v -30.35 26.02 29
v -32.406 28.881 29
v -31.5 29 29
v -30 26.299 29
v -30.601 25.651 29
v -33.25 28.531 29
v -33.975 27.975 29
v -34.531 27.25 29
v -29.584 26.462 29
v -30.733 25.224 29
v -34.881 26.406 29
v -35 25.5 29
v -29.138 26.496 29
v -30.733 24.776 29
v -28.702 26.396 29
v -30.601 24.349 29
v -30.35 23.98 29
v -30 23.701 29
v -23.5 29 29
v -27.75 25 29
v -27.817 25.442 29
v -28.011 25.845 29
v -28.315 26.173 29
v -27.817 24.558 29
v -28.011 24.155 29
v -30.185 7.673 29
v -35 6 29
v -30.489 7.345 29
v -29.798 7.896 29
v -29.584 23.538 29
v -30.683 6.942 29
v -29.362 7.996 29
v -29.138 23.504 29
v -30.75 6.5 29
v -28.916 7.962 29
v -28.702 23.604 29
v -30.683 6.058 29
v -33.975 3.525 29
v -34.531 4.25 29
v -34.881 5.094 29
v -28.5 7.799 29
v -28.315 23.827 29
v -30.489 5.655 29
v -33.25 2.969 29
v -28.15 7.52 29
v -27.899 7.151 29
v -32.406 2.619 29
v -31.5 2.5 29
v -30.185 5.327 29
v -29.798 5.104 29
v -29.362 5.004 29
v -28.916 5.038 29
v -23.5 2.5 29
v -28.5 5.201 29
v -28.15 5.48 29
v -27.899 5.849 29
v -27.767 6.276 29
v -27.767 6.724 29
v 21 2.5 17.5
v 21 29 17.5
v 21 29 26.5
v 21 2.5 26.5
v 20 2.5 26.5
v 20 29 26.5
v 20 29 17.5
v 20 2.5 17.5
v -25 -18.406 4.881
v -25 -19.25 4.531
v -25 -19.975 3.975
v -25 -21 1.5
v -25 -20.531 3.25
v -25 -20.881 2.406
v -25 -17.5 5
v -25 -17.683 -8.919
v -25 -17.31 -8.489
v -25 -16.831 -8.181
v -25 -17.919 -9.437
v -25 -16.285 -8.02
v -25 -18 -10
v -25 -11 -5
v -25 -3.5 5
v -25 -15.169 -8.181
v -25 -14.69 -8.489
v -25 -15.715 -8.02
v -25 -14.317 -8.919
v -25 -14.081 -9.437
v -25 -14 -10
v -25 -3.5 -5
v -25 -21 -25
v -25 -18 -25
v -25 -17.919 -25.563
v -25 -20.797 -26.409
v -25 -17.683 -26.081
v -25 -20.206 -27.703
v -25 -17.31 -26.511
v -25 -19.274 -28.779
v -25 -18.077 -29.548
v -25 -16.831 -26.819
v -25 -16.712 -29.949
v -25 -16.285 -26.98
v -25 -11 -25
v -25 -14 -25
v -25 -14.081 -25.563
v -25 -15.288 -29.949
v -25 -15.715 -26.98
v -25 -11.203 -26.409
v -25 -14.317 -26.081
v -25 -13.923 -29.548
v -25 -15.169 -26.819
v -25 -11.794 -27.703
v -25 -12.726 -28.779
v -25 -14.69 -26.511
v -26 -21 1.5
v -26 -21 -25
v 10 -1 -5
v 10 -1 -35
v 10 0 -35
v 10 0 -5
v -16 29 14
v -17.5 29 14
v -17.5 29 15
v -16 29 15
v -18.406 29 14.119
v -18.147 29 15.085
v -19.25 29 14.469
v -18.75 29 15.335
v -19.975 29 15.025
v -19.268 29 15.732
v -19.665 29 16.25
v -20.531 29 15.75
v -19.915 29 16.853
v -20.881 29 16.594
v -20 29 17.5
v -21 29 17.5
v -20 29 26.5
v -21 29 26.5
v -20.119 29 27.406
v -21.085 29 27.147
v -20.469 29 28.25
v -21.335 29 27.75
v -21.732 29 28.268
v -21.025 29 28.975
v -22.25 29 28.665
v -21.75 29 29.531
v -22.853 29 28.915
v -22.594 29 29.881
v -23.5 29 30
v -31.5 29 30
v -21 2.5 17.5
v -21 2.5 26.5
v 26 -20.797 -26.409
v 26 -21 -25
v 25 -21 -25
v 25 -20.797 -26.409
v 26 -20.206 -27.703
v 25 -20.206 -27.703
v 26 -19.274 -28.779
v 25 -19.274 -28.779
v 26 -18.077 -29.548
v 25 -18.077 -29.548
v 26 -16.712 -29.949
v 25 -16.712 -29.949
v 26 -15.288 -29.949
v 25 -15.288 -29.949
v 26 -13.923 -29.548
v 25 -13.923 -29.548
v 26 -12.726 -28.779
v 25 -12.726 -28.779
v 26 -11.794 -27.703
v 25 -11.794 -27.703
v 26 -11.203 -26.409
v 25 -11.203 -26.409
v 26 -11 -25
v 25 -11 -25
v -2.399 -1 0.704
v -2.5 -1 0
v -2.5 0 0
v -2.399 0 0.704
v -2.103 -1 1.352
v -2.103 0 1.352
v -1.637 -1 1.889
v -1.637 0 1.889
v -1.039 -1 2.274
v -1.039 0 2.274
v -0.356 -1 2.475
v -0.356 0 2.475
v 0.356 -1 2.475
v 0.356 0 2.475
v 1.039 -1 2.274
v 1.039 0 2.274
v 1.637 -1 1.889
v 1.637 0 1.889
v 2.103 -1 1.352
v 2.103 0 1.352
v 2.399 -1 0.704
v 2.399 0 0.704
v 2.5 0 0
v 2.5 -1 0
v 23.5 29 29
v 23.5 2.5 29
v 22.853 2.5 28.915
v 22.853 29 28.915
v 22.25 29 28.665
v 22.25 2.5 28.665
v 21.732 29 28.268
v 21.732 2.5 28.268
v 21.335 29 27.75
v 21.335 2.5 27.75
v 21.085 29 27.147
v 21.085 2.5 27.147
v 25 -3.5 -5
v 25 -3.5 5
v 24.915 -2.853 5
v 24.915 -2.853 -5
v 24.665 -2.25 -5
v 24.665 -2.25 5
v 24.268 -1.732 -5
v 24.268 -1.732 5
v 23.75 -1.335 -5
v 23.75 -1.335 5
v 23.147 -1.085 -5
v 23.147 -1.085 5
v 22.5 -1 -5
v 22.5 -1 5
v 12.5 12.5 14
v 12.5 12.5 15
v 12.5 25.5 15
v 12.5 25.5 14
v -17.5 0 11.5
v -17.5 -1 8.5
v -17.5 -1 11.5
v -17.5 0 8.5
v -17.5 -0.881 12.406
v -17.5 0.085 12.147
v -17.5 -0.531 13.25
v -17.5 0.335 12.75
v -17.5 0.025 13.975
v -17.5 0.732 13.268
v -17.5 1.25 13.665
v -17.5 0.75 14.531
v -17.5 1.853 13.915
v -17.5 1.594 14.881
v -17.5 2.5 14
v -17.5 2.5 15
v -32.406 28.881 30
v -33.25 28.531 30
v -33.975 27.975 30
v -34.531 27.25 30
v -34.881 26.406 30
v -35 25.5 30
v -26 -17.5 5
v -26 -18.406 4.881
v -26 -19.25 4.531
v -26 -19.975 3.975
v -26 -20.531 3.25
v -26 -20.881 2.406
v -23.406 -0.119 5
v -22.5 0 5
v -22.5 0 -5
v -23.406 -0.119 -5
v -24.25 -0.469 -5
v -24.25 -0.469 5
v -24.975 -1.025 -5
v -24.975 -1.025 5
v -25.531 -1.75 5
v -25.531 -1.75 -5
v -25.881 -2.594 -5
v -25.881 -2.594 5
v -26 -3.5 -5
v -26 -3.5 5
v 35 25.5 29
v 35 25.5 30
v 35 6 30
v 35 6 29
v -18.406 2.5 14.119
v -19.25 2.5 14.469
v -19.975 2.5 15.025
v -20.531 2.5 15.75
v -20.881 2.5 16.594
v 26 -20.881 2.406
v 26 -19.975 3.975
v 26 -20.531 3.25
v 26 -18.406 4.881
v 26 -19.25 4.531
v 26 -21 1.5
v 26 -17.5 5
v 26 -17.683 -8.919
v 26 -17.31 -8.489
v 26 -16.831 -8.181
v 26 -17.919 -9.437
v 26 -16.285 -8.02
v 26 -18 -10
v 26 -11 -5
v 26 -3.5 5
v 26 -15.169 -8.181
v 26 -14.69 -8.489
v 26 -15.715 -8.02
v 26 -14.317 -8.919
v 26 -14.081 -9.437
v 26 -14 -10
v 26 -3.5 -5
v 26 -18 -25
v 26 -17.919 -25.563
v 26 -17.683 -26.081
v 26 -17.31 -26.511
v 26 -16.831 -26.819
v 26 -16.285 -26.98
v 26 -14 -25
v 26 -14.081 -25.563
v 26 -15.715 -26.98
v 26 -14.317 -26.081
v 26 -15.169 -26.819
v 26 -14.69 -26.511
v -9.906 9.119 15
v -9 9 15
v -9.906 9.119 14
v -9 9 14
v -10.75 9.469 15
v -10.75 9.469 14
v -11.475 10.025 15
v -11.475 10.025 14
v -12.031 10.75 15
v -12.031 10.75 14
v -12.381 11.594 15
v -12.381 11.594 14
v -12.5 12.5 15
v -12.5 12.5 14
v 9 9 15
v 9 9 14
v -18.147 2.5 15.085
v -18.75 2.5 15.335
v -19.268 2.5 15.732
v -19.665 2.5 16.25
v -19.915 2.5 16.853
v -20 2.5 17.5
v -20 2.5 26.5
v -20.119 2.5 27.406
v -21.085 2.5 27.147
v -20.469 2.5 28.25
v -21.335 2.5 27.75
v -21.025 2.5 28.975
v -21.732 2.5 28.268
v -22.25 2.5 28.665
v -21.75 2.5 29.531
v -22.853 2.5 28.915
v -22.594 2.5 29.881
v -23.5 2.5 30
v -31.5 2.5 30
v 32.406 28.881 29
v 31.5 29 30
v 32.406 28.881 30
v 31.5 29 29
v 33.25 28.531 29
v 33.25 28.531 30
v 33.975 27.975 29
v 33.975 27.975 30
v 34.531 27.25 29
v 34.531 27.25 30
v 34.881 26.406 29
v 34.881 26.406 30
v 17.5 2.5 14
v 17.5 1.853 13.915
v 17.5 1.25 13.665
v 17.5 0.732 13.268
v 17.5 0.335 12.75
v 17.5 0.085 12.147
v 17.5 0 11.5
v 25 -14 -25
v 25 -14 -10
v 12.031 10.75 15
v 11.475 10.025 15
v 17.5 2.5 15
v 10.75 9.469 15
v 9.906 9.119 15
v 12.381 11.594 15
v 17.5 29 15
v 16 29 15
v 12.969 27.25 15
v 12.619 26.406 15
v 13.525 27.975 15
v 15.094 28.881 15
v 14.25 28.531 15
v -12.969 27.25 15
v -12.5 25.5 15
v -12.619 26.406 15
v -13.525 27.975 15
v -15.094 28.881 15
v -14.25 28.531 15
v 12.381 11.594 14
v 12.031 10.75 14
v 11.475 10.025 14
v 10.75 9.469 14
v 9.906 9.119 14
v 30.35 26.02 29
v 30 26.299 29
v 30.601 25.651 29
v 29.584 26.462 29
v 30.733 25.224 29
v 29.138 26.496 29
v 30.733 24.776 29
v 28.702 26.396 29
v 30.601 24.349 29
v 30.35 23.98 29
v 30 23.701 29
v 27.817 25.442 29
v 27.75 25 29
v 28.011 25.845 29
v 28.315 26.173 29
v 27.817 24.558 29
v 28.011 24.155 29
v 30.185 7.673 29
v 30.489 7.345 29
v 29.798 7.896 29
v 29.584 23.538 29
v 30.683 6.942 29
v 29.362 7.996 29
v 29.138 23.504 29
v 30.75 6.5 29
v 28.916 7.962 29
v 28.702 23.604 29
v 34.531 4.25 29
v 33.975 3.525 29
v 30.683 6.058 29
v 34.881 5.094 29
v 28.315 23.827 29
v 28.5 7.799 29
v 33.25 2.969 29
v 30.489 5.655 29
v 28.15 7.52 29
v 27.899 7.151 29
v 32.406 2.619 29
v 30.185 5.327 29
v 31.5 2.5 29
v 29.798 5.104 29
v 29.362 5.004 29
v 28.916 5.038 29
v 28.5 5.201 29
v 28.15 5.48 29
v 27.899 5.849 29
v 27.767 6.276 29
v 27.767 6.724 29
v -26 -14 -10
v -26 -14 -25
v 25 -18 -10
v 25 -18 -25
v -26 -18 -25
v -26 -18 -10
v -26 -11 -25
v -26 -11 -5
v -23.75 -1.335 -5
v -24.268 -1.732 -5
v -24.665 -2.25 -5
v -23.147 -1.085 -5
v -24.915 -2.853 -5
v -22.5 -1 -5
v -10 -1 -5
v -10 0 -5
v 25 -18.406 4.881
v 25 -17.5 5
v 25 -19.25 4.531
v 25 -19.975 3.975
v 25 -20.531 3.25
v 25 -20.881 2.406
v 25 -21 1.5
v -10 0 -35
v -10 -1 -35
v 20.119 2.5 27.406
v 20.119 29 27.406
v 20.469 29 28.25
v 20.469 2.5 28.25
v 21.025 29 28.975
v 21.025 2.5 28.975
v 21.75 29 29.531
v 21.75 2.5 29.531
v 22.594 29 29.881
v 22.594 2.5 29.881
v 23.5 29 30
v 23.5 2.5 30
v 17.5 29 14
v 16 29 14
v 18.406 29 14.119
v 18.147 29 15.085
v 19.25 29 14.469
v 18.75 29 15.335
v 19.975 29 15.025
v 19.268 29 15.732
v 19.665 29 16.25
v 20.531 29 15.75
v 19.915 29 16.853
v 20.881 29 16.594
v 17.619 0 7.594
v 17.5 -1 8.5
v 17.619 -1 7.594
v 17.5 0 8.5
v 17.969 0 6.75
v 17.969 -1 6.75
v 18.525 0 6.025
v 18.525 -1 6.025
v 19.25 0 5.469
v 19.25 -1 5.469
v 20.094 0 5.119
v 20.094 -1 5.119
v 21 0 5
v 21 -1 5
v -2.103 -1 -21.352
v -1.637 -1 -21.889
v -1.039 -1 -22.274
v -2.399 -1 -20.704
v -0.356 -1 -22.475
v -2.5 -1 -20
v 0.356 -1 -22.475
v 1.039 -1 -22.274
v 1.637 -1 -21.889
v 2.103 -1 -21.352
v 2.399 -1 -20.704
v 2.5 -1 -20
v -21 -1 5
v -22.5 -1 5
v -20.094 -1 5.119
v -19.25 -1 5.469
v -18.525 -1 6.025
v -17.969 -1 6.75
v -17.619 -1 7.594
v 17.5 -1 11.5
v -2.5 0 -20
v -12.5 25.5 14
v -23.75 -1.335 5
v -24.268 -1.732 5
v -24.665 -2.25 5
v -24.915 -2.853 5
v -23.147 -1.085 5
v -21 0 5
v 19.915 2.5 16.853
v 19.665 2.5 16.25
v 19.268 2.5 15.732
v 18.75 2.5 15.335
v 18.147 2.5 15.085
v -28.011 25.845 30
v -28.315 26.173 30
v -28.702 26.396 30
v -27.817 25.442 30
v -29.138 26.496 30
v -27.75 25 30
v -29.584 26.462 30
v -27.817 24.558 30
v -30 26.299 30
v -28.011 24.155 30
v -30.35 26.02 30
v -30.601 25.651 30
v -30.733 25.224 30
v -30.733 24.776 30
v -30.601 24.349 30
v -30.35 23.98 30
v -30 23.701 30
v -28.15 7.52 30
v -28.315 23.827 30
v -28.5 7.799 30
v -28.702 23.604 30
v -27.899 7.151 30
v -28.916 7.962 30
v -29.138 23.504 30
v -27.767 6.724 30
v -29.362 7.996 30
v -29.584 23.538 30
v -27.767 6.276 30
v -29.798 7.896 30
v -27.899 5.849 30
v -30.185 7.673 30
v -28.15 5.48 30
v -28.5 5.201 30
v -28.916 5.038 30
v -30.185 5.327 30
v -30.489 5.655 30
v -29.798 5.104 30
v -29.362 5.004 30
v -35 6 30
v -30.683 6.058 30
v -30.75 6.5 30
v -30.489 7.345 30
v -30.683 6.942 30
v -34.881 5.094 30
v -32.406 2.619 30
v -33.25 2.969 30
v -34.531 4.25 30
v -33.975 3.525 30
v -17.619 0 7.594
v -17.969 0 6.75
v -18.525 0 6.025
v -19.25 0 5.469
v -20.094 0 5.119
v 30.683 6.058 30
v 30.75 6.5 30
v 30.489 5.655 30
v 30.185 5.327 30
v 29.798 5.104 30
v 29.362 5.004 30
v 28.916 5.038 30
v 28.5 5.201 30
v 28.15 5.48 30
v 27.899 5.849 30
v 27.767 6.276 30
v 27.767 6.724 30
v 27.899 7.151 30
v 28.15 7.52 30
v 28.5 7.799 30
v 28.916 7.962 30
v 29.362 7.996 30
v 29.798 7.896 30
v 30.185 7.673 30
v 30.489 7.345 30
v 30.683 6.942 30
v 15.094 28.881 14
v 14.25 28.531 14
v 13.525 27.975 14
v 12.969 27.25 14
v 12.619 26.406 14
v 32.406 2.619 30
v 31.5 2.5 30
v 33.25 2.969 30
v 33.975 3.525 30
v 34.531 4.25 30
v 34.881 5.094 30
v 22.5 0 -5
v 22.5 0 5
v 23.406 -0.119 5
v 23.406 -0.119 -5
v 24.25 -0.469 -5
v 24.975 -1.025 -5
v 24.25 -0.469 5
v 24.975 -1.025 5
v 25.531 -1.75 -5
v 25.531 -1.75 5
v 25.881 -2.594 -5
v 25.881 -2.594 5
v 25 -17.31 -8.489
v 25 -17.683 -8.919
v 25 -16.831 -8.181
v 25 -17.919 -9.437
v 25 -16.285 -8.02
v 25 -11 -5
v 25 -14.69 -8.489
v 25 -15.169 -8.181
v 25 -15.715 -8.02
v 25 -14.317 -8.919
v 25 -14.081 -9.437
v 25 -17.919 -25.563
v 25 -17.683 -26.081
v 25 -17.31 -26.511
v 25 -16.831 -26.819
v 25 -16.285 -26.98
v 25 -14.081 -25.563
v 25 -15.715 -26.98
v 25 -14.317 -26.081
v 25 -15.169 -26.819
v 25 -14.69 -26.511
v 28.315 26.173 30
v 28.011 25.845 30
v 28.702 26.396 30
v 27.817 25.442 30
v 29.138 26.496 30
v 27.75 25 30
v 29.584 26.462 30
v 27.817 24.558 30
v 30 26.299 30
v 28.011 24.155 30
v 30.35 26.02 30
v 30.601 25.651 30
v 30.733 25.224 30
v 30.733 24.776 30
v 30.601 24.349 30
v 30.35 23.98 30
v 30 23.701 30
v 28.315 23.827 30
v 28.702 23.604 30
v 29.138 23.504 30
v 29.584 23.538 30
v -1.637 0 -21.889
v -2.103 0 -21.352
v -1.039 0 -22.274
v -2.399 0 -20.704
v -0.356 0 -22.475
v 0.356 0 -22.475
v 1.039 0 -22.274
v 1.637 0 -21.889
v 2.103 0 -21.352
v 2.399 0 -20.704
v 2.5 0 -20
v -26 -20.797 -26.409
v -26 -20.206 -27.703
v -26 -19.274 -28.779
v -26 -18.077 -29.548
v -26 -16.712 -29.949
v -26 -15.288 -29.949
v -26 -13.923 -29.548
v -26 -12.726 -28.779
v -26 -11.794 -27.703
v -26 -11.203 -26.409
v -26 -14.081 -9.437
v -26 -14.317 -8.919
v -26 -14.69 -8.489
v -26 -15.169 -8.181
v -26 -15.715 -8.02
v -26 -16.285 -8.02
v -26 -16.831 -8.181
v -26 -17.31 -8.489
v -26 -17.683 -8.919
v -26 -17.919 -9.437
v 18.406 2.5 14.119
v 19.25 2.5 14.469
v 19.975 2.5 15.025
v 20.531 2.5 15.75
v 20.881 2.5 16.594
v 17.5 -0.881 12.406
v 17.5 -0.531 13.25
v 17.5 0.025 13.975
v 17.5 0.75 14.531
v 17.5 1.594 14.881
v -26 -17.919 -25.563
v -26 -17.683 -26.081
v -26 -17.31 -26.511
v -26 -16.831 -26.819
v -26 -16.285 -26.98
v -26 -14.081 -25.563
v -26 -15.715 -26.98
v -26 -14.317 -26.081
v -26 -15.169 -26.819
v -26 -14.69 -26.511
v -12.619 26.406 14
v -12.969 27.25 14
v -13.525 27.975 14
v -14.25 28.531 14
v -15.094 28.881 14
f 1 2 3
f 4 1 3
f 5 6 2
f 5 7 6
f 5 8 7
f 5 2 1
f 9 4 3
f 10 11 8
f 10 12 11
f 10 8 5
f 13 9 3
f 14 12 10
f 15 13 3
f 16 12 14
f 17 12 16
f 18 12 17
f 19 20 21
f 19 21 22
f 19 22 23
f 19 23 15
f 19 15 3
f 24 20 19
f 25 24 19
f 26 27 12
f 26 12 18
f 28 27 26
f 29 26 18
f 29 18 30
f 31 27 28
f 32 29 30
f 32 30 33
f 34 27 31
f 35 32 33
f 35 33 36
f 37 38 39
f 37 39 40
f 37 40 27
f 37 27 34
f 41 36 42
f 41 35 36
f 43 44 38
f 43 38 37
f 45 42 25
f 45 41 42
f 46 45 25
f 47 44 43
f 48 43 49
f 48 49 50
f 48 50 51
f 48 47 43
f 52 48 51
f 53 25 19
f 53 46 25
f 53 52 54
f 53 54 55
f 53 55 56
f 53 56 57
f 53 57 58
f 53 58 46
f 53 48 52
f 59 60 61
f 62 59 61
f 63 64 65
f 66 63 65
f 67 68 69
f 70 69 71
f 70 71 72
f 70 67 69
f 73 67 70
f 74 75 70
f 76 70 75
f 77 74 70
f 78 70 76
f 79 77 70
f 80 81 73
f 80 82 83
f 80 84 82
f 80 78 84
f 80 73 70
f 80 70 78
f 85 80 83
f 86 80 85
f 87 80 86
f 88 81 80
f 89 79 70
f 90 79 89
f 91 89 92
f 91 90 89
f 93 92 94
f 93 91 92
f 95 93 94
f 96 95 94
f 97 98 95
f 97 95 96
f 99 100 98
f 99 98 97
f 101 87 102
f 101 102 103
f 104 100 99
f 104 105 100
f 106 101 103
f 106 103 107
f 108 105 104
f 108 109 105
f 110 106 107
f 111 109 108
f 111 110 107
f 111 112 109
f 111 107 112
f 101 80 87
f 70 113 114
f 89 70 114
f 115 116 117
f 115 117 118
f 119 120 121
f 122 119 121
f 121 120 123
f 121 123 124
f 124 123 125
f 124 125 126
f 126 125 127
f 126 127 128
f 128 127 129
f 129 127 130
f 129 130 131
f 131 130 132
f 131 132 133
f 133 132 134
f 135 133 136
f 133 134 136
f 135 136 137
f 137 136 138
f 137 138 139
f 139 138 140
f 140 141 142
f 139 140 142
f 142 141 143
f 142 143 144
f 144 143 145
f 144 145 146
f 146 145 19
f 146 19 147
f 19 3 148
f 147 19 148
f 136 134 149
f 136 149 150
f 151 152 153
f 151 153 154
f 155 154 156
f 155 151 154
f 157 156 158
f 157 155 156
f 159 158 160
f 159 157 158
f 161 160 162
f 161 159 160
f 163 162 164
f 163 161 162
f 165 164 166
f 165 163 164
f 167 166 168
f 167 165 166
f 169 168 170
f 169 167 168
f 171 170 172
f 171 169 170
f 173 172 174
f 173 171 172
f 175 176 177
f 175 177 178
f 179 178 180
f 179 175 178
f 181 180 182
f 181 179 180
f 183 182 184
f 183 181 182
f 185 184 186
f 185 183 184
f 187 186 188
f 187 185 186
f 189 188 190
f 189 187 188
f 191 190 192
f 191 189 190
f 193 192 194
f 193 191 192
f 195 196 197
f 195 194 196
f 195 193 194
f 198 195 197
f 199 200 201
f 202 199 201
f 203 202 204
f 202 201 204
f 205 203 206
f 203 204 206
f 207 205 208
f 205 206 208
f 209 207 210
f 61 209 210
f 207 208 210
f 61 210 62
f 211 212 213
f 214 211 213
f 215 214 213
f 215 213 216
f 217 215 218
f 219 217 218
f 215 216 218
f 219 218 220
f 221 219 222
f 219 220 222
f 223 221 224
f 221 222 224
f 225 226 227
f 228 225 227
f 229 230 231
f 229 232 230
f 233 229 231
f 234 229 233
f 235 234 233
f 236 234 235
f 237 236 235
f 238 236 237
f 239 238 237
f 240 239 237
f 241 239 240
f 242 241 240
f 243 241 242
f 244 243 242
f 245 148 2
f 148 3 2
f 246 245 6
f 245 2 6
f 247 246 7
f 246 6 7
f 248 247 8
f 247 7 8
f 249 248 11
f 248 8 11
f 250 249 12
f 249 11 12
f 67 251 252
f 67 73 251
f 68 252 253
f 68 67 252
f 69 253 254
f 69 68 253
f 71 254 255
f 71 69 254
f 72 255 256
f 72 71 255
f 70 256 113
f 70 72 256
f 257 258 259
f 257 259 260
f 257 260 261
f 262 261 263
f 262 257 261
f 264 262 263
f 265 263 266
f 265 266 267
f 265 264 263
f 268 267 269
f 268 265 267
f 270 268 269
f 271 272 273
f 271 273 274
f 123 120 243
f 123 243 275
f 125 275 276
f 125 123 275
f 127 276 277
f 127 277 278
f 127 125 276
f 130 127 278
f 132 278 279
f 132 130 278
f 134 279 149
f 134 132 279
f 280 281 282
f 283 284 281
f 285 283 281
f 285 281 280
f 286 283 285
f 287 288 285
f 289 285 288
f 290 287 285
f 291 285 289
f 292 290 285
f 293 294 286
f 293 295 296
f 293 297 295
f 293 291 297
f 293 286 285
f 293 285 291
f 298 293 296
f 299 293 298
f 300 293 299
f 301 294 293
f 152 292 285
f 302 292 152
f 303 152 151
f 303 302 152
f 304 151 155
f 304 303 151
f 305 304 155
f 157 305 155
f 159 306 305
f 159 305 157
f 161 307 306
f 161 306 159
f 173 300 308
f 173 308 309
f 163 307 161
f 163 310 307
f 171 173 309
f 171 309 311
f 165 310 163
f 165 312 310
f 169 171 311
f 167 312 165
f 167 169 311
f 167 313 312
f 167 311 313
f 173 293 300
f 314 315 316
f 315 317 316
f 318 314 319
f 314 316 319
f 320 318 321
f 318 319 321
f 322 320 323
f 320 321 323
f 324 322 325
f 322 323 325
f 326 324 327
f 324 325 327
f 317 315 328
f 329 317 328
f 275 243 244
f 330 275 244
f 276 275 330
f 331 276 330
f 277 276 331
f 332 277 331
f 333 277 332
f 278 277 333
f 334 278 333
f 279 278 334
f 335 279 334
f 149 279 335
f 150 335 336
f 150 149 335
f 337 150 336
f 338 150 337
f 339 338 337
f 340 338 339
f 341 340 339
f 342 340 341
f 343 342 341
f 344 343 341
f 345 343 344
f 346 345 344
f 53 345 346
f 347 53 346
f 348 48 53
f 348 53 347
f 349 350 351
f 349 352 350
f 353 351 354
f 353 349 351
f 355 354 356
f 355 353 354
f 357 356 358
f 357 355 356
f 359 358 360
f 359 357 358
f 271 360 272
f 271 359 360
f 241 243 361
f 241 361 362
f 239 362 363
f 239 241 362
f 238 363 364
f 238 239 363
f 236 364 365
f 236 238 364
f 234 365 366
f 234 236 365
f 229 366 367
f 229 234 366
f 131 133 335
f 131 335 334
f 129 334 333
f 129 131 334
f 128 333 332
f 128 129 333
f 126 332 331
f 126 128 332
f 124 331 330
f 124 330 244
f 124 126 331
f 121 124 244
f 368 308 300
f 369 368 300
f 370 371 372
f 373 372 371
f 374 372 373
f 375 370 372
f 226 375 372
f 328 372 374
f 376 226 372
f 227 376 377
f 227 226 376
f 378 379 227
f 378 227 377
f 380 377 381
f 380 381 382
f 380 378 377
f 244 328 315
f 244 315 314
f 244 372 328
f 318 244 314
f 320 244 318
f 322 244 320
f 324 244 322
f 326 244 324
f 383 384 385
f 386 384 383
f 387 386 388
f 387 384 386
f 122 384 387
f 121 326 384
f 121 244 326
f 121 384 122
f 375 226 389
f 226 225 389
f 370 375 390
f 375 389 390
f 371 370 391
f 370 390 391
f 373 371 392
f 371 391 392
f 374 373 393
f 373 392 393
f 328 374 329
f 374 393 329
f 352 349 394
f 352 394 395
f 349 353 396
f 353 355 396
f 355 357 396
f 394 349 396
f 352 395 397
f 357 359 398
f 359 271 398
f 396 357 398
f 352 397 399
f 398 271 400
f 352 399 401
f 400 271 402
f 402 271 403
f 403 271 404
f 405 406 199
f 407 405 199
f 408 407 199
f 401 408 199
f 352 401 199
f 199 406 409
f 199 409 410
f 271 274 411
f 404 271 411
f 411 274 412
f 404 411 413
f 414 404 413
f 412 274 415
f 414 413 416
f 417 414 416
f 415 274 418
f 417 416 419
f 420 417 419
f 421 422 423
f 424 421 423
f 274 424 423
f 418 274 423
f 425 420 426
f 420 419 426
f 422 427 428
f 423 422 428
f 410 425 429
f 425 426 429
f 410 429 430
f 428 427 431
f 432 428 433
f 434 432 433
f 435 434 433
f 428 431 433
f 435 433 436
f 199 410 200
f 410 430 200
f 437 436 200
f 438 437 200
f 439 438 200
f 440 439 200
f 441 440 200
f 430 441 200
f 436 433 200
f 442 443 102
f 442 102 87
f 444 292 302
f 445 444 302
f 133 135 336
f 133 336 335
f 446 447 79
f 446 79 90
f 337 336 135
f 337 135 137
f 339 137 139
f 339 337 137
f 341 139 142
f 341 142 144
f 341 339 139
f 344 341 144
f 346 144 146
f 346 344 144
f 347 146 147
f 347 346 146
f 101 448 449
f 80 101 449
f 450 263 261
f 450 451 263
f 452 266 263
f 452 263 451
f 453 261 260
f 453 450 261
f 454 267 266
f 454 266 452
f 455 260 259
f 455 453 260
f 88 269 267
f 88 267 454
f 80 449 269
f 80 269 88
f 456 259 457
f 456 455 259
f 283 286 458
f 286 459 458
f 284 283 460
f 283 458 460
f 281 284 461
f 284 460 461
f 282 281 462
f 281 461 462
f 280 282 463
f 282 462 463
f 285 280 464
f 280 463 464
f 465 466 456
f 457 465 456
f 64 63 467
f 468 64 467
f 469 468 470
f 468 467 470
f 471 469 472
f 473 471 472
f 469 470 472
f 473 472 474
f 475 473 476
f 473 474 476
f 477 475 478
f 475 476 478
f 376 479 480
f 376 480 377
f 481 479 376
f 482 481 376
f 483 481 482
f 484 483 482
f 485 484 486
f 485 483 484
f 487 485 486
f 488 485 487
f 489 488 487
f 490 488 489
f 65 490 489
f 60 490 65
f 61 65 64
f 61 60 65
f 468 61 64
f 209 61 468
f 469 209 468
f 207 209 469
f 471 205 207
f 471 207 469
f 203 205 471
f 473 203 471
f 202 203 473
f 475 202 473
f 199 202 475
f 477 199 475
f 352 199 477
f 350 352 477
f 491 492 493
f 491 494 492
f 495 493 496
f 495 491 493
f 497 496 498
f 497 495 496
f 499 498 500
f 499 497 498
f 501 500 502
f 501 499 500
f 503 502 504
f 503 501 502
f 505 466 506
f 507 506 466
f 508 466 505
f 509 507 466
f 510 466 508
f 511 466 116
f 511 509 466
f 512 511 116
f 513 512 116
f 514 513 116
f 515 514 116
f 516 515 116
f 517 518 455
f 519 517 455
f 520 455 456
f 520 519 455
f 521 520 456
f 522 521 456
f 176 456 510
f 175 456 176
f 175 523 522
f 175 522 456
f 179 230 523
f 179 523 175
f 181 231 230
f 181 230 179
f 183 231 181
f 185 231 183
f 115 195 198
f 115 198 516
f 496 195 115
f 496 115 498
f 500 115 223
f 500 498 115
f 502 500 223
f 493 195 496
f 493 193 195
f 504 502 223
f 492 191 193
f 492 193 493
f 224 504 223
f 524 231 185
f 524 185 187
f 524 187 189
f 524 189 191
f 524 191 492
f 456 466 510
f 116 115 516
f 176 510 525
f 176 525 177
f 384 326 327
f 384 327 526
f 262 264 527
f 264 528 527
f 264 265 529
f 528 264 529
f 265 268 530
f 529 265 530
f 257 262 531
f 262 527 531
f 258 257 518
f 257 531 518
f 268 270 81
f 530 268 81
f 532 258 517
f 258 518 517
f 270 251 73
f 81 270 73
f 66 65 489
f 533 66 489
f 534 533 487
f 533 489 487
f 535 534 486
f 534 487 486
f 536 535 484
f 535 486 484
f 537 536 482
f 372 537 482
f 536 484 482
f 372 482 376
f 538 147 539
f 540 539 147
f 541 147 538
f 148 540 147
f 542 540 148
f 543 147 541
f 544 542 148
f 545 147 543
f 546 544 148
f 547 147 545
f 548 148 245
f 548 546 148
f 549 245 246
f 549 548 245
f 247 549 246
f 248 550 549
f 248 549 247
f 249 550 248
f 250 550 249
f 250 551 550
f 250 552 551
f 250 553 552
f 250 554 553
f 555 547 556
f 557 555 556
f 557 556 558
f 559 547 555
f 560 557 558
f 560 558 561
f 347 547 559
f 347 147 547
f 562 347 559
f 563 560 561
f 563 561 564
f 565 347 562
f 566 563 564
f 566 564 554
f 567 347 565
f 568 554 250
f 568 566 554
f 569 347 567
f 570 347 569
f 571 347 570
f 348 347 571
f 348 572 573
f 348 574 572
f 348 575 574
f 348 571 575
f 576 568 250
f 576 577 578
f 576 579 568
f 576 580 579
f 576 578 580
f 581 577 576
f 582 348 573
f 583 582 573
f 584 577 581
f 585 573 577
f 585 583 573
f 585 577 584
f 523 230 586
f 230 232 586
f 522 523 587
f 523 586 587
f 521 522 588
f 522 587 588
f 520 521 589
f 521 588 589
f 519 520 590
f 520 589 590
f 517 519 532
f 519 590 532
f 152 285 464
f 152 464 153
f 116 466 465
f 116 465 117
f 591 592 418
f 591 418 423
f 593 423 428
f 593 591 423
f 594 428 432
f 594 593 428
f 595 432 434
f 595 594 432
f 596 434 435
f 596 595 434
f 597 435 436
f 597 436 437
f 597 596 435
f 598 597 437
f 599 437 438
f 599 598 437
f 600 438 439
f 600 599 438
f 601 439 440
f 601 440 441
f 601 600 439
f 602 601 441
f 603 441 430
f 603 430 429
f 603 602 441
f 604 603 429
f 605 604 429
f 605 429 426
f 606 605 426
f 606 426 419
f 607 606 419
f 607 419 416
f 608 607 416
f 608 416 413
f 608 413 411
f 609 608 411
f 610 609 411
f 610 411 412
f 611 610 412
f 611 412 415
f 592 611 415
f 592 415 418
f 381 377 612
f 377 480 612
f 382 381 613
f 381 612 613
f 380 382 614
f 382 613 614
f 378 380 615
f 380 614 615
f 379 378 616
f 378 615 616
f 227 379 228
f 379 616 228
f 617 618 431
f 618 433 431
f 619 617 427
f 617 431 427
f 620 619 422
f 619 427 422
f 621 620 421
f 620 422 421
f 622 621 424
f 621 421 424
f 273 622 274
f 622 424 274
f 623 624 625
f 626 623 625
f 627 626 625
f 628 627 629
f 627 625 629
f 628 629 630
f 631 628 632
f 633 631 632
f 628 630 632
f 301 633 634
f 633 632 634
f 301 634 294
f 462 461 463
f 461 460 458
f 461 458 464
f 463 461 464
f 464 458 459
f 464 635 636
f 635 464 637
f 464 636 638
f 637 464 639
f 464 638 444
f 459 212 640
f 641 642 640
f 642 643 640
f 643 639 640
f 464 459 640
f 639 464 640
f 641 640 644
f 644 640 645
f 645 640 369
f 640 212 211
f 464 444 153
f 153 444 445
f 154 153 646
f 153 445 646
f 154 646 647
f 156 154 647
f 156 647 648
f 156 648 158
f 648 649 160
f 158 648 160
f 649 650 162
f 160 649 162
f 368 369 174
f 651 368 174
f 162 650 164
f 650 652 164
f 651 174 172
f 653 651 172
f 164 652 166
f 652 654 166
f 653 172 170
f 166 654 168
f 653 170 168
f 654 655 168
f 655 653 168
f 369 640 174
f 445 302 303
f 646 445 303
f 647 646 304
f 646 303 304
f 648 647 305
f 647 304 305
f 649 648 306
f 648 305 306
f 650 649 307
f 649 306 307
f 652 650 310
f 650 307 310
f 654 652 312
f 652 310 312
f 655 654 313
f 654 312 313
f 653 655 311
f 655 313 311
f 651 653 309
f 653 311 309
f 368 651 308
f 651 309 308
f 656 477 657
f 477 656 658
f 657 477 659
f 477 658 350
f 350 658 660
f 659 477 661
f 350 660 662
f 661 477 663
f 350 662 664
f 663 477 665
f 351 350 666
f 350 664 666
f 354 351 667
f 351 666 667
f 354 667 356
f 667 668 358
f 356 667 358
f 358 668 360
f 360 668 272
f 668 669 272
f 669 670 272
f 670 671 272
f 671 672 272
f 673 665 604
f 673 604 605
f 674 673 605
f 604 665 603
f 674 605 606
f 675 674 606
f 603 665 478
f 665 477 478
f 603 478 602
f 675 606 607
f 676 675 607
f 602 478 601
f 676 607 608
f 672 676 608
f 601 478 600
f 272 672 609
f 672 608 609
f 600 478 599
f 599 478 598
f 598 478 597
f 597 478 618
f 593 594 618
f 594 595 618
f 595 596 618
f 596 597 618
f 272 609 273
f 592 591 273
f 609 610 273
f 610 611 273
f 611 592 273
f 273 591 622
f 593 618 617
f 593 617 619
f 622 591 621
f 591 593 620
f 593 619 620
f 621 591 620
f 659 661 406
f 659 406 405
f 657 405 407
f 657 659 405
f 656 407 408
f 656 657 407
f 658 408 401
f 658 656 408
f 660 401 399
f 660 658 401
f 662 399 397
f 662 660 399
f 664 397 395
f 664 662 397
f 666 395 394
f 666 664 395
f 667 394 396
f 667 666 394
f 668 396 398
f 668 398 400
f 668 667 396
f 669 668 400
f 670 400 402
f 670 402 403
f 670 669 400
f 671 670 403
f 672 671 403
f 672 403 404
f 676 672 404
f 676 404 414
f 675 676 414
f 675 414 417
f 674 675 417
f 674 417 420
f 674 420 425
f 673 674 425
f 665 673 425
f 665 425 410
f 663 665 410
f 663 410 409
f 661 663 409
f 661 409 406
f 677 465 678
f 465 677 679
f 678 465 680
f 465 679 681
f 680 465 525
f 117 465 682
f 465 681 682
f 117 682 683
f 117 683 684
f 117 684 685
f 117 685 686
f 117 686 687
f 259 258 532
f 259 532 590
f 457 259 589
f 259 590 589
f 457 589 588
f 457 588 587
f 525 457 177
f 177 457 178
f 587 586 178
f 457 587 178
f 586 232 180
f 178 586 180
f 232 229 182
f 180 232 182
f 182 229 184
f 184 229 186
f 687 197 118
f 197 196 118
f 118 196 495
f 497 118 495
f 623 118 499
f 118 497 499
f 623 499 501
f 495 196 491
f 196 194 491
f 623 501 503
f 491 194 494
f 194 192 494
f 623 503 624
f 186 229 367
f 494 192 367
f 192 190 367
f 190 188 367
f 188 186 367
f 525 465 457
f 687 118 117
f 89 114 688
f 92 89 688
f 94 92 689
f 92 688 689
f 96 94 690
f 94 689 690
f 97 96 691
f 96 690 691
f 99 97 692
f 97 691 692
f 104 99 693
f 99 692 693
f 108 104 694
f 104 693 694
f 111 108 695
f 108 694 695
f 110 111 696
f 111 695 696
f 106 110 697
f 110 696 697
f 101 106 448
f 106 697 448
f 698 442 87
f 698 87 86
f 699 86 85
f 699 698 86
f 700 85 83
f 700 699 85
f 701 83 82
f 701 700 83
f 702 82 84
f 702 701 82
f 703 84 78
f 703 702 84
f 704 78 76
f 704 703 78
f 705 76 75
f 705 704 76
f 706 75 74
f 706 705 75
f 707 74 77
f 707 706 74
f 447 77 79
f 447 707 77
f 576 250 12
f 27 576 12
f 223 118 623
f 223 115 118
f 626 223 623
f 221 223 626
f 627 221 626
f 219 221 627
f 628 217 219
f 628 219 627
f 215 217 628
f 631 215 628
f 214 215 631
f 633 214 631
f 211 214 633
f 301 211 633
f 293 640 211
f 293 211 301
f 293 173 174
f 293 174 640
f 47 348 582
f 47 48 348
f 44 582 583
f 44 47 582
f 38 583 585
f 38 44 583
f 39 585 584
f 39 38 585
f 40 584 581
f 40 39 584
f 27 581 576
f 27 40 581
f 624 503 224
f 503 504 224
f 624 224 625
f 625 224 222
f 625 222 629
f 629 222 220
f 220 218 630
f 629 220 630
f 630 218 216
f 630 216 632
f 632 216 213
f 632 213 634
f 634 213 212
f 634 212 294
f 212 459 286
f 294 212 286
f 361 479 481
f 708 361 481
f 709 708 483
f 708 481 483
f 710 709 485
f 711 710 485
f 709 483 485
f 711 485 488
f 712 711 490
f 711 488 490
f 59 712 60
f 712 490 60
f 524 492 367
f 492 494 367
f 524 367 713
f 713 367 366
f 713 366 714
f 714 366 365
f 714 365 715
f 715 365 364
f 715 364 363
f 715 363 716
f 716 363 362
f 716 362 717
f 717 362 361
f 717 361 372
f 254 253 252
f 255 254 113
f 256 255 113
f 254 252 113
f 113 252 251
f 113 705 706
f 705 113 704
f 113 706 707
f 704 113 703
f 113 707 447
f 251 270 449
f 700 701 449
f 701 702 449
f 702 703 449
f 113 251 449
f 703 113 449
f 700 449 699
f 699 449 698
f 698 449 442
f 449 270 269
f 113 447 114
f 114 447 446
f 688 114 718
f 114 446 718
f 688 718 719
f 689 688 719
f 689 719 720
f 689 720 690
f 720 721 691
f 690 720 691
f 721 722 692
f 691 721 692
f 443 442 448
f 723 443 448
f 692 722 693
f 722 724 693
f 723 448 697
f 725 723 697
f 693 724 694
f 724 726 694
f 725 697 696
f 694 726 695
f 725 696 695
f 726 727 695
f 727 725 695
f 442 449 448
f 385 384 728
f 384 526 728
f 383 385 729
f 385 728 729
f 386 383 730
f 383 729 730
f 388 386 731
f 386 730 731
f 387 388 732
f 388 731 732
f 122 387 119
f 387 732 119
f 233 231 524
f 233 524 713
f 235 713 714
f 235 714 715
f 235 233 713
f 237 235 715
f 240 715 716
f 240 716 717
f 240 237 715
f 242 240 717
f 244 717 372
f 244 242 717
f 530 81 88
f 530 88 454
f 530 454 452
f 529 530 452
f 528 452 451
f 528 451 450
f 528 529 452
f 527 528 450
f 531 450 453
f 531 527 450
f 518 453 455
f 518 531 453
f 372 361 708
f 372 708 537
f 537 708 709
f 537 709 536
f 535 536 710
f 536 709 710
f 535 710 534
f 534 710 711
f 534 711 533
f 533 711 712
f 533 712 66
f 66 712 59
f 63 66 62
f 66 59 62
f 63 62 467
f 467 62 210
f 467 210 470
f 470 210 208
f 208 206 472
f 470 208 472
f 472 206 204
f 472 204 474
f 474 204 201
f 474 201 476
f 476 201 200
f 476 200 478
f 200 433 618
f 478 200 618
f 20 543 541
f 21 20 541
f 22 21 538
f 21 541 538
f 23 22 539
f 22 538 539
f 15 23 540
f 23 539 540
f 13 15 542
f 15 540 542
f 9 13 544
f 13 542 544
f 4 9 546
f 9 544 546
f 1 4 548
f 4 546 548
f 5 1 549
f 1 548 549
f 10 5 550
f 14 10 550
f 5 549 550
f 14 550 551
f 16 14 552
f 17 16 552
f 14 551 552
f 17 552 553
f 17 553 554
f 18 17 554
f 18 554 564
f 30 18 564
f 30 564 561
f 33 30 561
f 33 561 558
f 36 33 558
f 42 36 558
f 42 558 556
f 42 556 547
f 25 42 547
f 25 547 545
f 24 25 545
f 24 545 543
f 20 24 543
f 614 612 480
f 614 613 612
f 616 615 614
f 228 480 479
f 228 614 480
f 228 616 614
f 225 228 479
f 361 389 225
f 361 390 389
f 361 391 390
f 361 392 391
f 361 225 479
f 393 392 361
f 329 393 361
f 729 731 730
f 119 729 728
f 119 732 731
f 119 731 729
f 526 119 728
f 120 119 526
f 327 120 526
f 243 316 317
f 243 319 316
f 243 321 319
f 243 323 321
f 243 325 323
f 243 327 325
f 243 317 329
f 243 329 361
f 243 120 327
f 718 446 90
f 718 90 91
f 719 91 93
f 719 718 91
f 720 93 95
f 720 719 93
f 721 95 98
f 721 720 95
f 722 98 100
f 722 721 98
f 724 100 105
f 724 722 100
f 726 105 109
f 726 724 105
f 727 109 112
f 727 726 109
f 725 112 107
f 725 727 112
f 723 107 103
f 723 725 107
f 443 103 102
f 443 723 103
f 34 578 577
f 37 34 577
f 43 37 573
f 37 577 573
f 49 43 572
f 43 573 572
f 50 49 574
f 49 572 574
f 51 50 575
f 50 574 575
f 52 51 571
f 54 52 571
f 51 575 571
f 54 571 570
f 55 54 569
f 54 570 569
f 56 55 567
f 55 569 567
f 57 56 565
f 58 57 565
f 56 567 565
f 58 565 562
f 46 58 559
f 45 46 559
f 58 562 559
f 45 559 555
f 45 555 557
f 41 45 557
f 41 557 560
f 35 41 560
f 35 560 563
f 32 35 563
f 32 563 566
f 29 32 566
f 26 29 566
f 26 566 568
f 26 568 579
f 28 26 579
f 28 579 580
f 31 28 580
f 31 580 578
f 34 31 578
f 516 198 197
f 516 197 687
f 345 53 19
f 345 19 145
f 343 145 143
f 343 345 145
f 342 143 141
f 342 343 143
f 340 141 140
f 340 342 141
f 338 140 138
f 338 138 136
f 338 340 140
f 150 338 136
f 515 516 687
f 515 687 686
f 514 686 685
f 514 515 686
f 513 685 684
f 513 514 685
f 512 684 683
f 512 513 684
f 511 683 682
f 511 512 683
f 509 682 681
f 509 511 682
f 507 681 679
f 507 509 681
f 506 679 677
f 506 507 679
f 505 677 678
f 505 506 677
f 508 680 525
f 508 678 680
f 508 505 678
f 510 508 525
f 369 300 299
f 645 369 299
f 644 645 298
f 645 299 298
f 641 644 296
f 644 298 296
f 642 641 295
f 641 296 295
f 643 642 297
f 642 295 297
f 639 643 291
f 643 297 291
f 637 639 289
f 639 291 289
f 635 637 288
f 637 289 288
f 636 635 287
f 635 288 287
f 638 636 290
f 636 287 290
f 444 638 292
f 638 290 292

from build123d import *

# Parameters (mm, degrees)
SKETCH_1_W                       = 50
SKETCH_1_H                       = 1
SM_BASE_FLANGE_1_DEPTH           = 5
SM_EDGE_FLANGE_1_STRIP_W         = 9
SM_EDGE_FLANGE_1_STRIP_H         = 1
SM_EDGE_FLANGE_1_STRIP_CUT_DEPTH = 10
SM_EDGE_FLANGE_1_DEPTH           = 10
SM_BASE_FLANGE_1_2_DEPTH         = 1
SKETCH_12_W                      = 20
SKETCH_12_H                      = 30
SKETCH_12_W_2                    = 35
SKETCH_12_H_2                    = 10
SM_BASE_FLANGE_2_DEPTH           = 1
SM_EDGE_FLANGE_3_STRIP_W         = 9
SM_EDGE_FLANGE_3_STRIP_H         = 1
SM_EDGE_FLANGE_3_STRIP_CUT_DEPTH = 35
SM_EDGE_FLANGE_3_DEPTH           = 35
CUT_EXTRUDE_1_REACH              = 65.38
SKETCH_21_W                      = 25
SKETCH_21_H                      = 20
SM_EDGE_FLANGE_4_DEPTH           = 26.5
SM_EDGE_FLANGE_5_STRIP_W         = 9
SM_EDGE_FLANGE_5_STRIP_H         = 1
SM_EDGE_FLANGE_5_STRIP_CUT_DEPTH = 26.5
SM_EDGE_FLANGE_5_DEPTH           = 26.5
CUT_EXTRUDE_2_REACH              = 81.316
SKETCH_28_R                      = 1.5
FILLET_1_R                       = 3.5
CUT_EXTRUDE_3_REACH              = 59.879


# Sheet-metal steps are written as plain solids
with BuildPart() as part:
    # Sketch 1 → Sm Base Flange 1 (new, symmetric)
    with BuildSketch(Plane.XY):
        with Locations((0, -0.5)):
            Rectangle(SKETCH_1_W, SKETCH_1_H)
    extrude(amount=SM_BASE_FLANGE_1_DEPTH, both=True)

    # 边线-法兰1 strip (across the edge) → 边线-法兰1 strip cut (cut)
    with BuildSketch(Plane(origin=(-25, -1, 5), x_dir=(1, 0, 0), z_dir=(0, 0, -1))):
        with Locations((-2, -0.5)):
            Rectangle(SM_EDGE_FLANGE_1_STRIP_W, SM_EDGE_FLANGE_1_STRIP_H)
    sm_edge_flange_1_strip_cut = extrude(amount=SM_EDGE_FLANGE_1_STRIP_CUT_DEPTH, mode=Mode.SUBTRACT)

    # 边线-法兰1 section (across the edge) → 边线-法兰1 (add)
    with BuildSketch(Plane(origin=(-25, -1, 5), x_dir=(1, 0, 0), z_dir=(0, 0, -1))):
        with BuildLine():
            Line((-1, 2.5), (-1, 20))
            Line((-1, 20), (0, 20))
            Line((0, 20), (0, 2.5))
            ThreePointArc((0, 2.5), (0.732233047, 0.732233047), (2.5, 0))
            Line((2.5, 0), (2.5, -1))
            ThreePointArc((2.5, -1), (0.025126266, 0.025126266), (-1, 2.5))
        make_face()
    sm_edge_flange_1 = extrude(amount=SM_EDGE_FLANGE_1_DEPTH)

    # 草图9 → Sm Base Flange 1 2 (add)
    with BuildSketch(Plane.ZY.offset(26)):
        with BuildLine():
            Line((-5, -21), (-25, -21))
            ThreePointArc((-25, -21), (-30, -16), (-25, -11))
            Line((-25, -11), (-5, -11))
            Line((-5, -11), (-5, -21))
        make_face()
        with BuildLine():
            Line((-10, -18), (-25, -18))
            ThreePointArc((-25, -18), (-27, -16), (-25, -14))
            Line((-25, -14), (-10, -14))
            ThreePointArc((-10, -14), (-8, -16), (-10, -18))
        make_face(mode=Mode.SUBTRACT)
    sm_base_flange_1_2 = extrude(amount=-SM_BASE_FLANGE_1_2_DEPTH)

    # 镜向1: 边线-法兰1 strip cut, 边线-法兰1, Sm Base Flange 1 2 across plane
    add(sm_edge_flange_1_strip_cut.mirror(Plane(origin=(0, 0, 0), x_dir=(0, 0, 1), z_dir=(1, 0, 0))), mode=Mode.SUBTRACT)
    add(sm_edge_flange_1.mirror(Plane(origin=(0, 0, 0), x_dir=(0, 0, 1), z_dir=(1, 0, 0))))
    add(sm_base_flange_1_2.mirror(Plane(origin=(0, 0, 0), x_dir=(0, 0, 1), z_dir=(1, 0, 0))))

    # 草图12 → 薄片2 (add)
    with BuildSketch(Plane.XZ.offset(1)):
        with Locations((0, -20)):
            Rectangle(SKETCH_12_W, SKETCH_12_H)
        with Locations((0, 10)):
            Rectangle(SKETCH_12_W_2, SKETCH_12_H_2)
    extrude(amount=-SM_BASE_FLANGE_2_DEPTH)

    # 边线-法兰3 strip (across the edge) → 边线-法兰3 strip cut (cut)
    with BuildSketch(Plane(origin=(-17.5, 0, 15), x_dir=(0, 0, -1), z_dir=(1, 0, 0))):
        with Locations((-1, -0.5)):
            Rectangle(SM_EDGE_FLANGE_3_STRIP_W, SM_EDGE_FLANGE_3_STRIP_H)
    extrude(amount=SM_EDGE_FLANGE_3_STRIP_CUT_DEPTH, mode=Mode.SUBTRACT)

    # 边线-法兰3 section (across the edge) → 边线-法兰3 (add)
    with BuildSketch(Plane(origin=(-17.5, 0, 15), x_dir=(0, 0, -1), z_dir=(1, 0, 0))):
        with BuildLine():
            Line((0, 2.5), (0, 29))
            Line((0, 29), (1, 29))
            Line((1, 29), (1, 2.5))
            ThreePointArc((1, 2.5), (1.732233047, 0.732233047), (3.5, 0))
            Line((3.5, 0), (3.5, -1))
            ThreePointArc((3.5, -1), (1.025126266, 0.025126266), (0, 2.5))
        make_face()
    extrude(amount=SM_EDGE_FLANGE_3_DEPTH)

    # 草图21 → 切除-拉伸1 (cut, up to next)
    with BuildSketch(Plane.XY.offset(15), mode=Mode.PRIVATE) as cut_extrude_1_sk1:
        with Locations((0, 19)):
            Rectangle(SKETCH_21_W, SKETCH_21_H)
    cut_extrude_1_tool1 = extrude(cut_extrude_1_sk1.sketch, amount=-CUT_EXTRUDE_1_REACH, mode=Mode.PRIVATE) & part.part
    add(cut_extrude_1_tool1.solids().sort_by_distance((0, 19, 15))[0], mode=Mode.SUBTRACT)

    # 边线-法兰4 section (across the edge) → 边线-法兰4 (add)
    with BuildSketch(Plane(origin=(-20, 29, 15), x_dir=(1, 0, 0), z_dir=(0, -1, 0))):
        with BuildLine():
            Line((-1, 2.5), (-1, 14))
            Line((-1, 14), (0, 14))
            Line((0, 14), (0, 2.5))
            ThreePointArc((0, 2.5), (0.732233047, 0.732233047), (2.5, 0))
            Line((2.5, 0), (2.5, -1))
            ThreePointArc((2.5, -1), (0.025126266, 0.025126266), (-1, 2.5))
        make_face()
    sm_edge_flange_4 = extrude(amount=SM_EDGE_FLANGE_4_DEPTH)

    # 边线-法兰5 strip (across the edge) → 边线-法兰5 strip cut (cut)
    with BuildSketch(Plane(origin=(-21, 2.5, 29), x_dir=(0, 0, -1), z_dir=(0, 1, 0))):
        with Locations((-2, -0.5)):
            Rectangle(SM_EDGE_FLANGE_5_STRIP_W, SM_EDGE_FLANGE_5_STRIP_H)
    sm_edge_flange_5_strip_cut = extrude(amount=SM_EDGE_FLANGE_5_STRIP_CUT_DEPTH, mode=Mode.SUBTRACT)

    # 边线-法兰5 section (across the edge) → 边线-法兰5 (add)
    with BuildSketch(Plane(origin=(-21, 2.5, 29), x_dir=(0, 0, -1), z_dir=(0, 1, 0))):
        with BuildLine():
            Line((-1, 2.5), (-1, 14))
            Line((-1, 14), (0, 14))
            Line((0, 14), (0, 2.5))
            ThreePointArc((0, 2.5), (0.732233047, 0.732233047), (2.5, 0))
            Line((2.5, 0), (2.5, -1))
            ThreePointArc((2.5, -1), (0.025126266, 0.025126266), (-1, 2.5))
        make_face()
    sm_edge_flange_5 = extrude(amount=SM_EDGE_FLANGE_5_DEPTH)

    # 草图28 → 切除-拉伸2 (cut, up to next)
    with BuildSketch(Plane.XY.offset(30), mode=Mode.PRIVATE) as cut_extrude_2_sk1:
        with Locations((-29.25, 25)):
            Circle(SKETCH_28_R)
    cut_extrude_2_tool1 = extrude(cut_extrude_2_sk1.sketch, amount=-CUT_EXTRUDE_2_REACH, mode=Mode.PRIVATE) & part.part
    # 草图28 → 切除-拉伸2 (cut, up to next)
    with BuildSketch(Plane.XY.offset(30), mode=Mode.PRIVATE) as cut_extrude_2_sk2:
        with Locations(Location((-29.25, 6.5, 0), (0, 0, 180))):
            Circle(SKETCH_28_R)
    cut_extrude_2_tool2 = extrude(cut_extrude_2_sk2.sketch, amount=-CUT_EXTRUDE_2_REACH, mode=Mode.PRIVATE) & part.part
    cut_extrude_2_1 = cut_extrude_2_tool1.solids().sort_by_distance((-29.25, 25, 30))[0]
    add(cut_extrude_2_1, mode=Mode.SUBTRACT)
    cut_extrude_2_2 = cut_extrude_2_tool2.solids().sort_by_distance((-29.25, 6.5, 30))[0]
    add(cut_extrude_2_2, mode=Mode.SUBTRACT)
    cut_extrude_2 = cut_extrude_2_1 + cut_extrude_2_2  # 切除-拉伸2 as one shape, for the pattern or mirror that repeats it

    # 镜向2: 边线-法兰4, 边线-法兰5 strip cut, 边线-法兰5, 切除-拉伸2 across plane
    add(sm_edge_flange_4.mirror(Plane(origin=(0, 0, 0), x_dir=(0, 0, 1), z_dir=(1, 0, 0))))
    add(sm_edge_flange_5_strip_cut.mirror(Plane(origin=(0, 0, 0), x_dir=(0, 0, 1), z_dir=(1, 0, 0))), mode=Mode.SUBTRACT)
    add(sm_edge_flange_5.mirror(Plane(origin=(0, 0, 0), x_dir=(0, 0, 1), z_dir=(1, 0, 0))))
    add(cut_extrude_2.mirror(Plane(origin=(0, 0, 0), x_dir=(0, 0, 1), z_dir=(1, 0, 0))), mode=Mode.SUBTRACT)

    # 圆角1
    fillet_1_edges = [part.edges().sort_by_distance(p)[0] for p in [
        (17.5, -0.5, 5),
        (-17.5, -0.5, 5),
        (12.5, 29, 14.5),
        (12.5, 9, 14.5),
        (-12.5, 9, 14.5),
        (-12.5, 29, 14.5),
        (-35, 2.5, 29.5),
        (-35, 29, 29.5),
        (35, 29, 29.5),
        (35, 2.5, 29.5),
        (-25.5, -21, 5),
        (25.5, -21, 5),
    ]]
    fillet(fillet_1_edges, radius=FILLET_1_R)

    # 草图29 → 切除-拉伸3 (cut, up to next)
    with BuildSketch(Plane.XZ.offset(1), mode=Mode.PRIVATE) as cut_extrude_3_sk1:
        with BuildLine():
            Line((2.5, 0), (2.5, -20))
            ThreePointArc((2.5, -20), (0, -22.5), (-2.5, -20))
            Line((-2.5, -20), (-2.5, 0))
            ThreePointArc((-2.5, 0), (0, 2.5), (2.5, 0))
        make_face()
    cut_extrude_3_tool1 = extrude(cut_extrude_3_sk1.sketch, amount=-CUT_EXTRUDE_3_REACH, mode=Mode.PRIVATE) & part.part
    add(cut_extrude_3_tool1.solids().sort_by_distance((0, -1, -10))[0], mode=Mode.SUBTRACT)


solid = part.part
